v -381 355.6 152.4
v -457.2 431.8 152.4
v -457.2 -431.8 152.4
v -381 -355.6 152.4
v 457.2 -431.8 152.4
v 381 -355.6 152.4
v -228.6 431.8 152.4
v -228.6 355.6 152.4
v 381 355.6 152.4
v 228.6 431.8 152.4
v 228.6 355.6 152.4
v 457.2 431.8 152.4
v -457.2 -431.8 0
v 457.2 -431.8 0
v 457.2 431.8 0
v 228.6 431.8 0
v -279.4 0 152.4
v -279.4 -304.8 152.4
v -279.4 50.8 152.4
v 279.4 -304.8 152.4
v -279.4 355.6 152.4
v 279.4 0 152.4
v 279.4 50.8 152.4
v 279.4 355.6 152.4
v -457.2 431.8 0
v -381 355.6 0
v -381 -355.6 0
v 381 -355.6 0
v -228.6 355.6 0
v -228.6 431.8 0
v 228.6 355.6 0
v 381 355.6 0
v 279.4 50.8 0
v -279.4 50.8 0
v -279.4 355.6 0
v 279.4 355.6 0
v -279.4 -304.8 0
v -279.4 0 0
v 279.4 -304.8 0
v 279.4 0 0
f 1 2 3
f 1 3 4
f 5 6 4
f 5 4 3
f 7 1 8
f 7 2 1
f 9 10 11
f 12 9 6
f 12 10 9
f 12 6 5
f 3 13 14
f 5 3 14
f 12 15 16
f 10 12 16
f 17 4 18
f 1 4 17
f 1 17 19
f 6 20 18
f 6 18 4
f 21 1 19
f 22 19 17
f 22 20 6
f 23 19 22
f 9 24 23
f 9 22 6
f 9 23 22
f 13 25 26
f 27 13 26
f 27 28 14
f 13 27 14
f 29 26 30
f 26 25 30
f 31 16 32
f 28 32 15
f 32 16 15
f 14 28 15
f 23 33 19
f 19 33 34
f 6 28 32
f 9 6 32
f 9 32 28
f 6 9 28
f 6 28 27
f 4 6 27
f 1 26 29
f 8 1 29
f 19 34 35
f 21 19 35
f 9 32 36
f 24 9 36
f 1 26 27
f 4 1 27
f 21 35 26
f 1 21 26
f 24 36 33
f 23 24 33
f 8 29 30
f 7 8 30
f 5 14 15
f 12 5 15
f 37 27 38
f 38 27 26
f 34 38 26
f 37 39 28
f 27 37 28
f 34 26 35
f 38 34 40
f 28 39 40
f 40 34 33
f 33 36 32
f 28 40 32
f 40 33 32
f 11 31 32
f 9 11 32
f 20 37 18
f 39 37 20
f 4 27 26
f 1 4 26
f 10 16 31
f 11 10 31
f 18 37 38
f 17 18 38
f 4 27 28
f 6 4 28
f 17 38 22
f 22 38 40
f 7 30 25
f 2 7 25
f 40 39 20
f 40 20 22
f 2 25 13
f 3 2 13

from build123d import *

# Parameters (mm, degrees)
F2_DEPTH = 152.4
F1_W     = 558.8
F1_H     = 304.8
F3_DEPTH = 152.4


with BuildPart() as f2:
    # F0 (on Top) → F2 (new body)
    with BuildSketch(Plane.XY):
        Polygon((228.6, 355.6), (381, 355.6), (381, -355.6), (-381, -355.6), (-381, 355.6), (-228.6, 355.6), (-228.6, 431.8), (-457.2, 431.8), (-457.2, -431.8), (457.2, -431.8), (457.2, 431.8), (228.6, 431.8), align=None)
    extrude(amount=F2_DEPTH)


with BuildPart() as f3:
    # F1 (on Top) → F3 (new body)
    with BuildSketch(Plane.XY):
        Polygon((-279.4, 355.6), (-381, 355.6), (-381, -355.6), (-279.4, -355.6), (279.4, -355.6), (381, -355.6), (381, 355.6), (279.4, 355.6), (279.4, 50.8), (-279.4, 50.8), align=None)
        with Locations((0, -152.4)):
            Rectangle(F1_W, F1_H, mode=Mode.SUBTRACT)
    extrude(amount=F3_DEPTH)


solid = Compound([f2.part, f3.part])
